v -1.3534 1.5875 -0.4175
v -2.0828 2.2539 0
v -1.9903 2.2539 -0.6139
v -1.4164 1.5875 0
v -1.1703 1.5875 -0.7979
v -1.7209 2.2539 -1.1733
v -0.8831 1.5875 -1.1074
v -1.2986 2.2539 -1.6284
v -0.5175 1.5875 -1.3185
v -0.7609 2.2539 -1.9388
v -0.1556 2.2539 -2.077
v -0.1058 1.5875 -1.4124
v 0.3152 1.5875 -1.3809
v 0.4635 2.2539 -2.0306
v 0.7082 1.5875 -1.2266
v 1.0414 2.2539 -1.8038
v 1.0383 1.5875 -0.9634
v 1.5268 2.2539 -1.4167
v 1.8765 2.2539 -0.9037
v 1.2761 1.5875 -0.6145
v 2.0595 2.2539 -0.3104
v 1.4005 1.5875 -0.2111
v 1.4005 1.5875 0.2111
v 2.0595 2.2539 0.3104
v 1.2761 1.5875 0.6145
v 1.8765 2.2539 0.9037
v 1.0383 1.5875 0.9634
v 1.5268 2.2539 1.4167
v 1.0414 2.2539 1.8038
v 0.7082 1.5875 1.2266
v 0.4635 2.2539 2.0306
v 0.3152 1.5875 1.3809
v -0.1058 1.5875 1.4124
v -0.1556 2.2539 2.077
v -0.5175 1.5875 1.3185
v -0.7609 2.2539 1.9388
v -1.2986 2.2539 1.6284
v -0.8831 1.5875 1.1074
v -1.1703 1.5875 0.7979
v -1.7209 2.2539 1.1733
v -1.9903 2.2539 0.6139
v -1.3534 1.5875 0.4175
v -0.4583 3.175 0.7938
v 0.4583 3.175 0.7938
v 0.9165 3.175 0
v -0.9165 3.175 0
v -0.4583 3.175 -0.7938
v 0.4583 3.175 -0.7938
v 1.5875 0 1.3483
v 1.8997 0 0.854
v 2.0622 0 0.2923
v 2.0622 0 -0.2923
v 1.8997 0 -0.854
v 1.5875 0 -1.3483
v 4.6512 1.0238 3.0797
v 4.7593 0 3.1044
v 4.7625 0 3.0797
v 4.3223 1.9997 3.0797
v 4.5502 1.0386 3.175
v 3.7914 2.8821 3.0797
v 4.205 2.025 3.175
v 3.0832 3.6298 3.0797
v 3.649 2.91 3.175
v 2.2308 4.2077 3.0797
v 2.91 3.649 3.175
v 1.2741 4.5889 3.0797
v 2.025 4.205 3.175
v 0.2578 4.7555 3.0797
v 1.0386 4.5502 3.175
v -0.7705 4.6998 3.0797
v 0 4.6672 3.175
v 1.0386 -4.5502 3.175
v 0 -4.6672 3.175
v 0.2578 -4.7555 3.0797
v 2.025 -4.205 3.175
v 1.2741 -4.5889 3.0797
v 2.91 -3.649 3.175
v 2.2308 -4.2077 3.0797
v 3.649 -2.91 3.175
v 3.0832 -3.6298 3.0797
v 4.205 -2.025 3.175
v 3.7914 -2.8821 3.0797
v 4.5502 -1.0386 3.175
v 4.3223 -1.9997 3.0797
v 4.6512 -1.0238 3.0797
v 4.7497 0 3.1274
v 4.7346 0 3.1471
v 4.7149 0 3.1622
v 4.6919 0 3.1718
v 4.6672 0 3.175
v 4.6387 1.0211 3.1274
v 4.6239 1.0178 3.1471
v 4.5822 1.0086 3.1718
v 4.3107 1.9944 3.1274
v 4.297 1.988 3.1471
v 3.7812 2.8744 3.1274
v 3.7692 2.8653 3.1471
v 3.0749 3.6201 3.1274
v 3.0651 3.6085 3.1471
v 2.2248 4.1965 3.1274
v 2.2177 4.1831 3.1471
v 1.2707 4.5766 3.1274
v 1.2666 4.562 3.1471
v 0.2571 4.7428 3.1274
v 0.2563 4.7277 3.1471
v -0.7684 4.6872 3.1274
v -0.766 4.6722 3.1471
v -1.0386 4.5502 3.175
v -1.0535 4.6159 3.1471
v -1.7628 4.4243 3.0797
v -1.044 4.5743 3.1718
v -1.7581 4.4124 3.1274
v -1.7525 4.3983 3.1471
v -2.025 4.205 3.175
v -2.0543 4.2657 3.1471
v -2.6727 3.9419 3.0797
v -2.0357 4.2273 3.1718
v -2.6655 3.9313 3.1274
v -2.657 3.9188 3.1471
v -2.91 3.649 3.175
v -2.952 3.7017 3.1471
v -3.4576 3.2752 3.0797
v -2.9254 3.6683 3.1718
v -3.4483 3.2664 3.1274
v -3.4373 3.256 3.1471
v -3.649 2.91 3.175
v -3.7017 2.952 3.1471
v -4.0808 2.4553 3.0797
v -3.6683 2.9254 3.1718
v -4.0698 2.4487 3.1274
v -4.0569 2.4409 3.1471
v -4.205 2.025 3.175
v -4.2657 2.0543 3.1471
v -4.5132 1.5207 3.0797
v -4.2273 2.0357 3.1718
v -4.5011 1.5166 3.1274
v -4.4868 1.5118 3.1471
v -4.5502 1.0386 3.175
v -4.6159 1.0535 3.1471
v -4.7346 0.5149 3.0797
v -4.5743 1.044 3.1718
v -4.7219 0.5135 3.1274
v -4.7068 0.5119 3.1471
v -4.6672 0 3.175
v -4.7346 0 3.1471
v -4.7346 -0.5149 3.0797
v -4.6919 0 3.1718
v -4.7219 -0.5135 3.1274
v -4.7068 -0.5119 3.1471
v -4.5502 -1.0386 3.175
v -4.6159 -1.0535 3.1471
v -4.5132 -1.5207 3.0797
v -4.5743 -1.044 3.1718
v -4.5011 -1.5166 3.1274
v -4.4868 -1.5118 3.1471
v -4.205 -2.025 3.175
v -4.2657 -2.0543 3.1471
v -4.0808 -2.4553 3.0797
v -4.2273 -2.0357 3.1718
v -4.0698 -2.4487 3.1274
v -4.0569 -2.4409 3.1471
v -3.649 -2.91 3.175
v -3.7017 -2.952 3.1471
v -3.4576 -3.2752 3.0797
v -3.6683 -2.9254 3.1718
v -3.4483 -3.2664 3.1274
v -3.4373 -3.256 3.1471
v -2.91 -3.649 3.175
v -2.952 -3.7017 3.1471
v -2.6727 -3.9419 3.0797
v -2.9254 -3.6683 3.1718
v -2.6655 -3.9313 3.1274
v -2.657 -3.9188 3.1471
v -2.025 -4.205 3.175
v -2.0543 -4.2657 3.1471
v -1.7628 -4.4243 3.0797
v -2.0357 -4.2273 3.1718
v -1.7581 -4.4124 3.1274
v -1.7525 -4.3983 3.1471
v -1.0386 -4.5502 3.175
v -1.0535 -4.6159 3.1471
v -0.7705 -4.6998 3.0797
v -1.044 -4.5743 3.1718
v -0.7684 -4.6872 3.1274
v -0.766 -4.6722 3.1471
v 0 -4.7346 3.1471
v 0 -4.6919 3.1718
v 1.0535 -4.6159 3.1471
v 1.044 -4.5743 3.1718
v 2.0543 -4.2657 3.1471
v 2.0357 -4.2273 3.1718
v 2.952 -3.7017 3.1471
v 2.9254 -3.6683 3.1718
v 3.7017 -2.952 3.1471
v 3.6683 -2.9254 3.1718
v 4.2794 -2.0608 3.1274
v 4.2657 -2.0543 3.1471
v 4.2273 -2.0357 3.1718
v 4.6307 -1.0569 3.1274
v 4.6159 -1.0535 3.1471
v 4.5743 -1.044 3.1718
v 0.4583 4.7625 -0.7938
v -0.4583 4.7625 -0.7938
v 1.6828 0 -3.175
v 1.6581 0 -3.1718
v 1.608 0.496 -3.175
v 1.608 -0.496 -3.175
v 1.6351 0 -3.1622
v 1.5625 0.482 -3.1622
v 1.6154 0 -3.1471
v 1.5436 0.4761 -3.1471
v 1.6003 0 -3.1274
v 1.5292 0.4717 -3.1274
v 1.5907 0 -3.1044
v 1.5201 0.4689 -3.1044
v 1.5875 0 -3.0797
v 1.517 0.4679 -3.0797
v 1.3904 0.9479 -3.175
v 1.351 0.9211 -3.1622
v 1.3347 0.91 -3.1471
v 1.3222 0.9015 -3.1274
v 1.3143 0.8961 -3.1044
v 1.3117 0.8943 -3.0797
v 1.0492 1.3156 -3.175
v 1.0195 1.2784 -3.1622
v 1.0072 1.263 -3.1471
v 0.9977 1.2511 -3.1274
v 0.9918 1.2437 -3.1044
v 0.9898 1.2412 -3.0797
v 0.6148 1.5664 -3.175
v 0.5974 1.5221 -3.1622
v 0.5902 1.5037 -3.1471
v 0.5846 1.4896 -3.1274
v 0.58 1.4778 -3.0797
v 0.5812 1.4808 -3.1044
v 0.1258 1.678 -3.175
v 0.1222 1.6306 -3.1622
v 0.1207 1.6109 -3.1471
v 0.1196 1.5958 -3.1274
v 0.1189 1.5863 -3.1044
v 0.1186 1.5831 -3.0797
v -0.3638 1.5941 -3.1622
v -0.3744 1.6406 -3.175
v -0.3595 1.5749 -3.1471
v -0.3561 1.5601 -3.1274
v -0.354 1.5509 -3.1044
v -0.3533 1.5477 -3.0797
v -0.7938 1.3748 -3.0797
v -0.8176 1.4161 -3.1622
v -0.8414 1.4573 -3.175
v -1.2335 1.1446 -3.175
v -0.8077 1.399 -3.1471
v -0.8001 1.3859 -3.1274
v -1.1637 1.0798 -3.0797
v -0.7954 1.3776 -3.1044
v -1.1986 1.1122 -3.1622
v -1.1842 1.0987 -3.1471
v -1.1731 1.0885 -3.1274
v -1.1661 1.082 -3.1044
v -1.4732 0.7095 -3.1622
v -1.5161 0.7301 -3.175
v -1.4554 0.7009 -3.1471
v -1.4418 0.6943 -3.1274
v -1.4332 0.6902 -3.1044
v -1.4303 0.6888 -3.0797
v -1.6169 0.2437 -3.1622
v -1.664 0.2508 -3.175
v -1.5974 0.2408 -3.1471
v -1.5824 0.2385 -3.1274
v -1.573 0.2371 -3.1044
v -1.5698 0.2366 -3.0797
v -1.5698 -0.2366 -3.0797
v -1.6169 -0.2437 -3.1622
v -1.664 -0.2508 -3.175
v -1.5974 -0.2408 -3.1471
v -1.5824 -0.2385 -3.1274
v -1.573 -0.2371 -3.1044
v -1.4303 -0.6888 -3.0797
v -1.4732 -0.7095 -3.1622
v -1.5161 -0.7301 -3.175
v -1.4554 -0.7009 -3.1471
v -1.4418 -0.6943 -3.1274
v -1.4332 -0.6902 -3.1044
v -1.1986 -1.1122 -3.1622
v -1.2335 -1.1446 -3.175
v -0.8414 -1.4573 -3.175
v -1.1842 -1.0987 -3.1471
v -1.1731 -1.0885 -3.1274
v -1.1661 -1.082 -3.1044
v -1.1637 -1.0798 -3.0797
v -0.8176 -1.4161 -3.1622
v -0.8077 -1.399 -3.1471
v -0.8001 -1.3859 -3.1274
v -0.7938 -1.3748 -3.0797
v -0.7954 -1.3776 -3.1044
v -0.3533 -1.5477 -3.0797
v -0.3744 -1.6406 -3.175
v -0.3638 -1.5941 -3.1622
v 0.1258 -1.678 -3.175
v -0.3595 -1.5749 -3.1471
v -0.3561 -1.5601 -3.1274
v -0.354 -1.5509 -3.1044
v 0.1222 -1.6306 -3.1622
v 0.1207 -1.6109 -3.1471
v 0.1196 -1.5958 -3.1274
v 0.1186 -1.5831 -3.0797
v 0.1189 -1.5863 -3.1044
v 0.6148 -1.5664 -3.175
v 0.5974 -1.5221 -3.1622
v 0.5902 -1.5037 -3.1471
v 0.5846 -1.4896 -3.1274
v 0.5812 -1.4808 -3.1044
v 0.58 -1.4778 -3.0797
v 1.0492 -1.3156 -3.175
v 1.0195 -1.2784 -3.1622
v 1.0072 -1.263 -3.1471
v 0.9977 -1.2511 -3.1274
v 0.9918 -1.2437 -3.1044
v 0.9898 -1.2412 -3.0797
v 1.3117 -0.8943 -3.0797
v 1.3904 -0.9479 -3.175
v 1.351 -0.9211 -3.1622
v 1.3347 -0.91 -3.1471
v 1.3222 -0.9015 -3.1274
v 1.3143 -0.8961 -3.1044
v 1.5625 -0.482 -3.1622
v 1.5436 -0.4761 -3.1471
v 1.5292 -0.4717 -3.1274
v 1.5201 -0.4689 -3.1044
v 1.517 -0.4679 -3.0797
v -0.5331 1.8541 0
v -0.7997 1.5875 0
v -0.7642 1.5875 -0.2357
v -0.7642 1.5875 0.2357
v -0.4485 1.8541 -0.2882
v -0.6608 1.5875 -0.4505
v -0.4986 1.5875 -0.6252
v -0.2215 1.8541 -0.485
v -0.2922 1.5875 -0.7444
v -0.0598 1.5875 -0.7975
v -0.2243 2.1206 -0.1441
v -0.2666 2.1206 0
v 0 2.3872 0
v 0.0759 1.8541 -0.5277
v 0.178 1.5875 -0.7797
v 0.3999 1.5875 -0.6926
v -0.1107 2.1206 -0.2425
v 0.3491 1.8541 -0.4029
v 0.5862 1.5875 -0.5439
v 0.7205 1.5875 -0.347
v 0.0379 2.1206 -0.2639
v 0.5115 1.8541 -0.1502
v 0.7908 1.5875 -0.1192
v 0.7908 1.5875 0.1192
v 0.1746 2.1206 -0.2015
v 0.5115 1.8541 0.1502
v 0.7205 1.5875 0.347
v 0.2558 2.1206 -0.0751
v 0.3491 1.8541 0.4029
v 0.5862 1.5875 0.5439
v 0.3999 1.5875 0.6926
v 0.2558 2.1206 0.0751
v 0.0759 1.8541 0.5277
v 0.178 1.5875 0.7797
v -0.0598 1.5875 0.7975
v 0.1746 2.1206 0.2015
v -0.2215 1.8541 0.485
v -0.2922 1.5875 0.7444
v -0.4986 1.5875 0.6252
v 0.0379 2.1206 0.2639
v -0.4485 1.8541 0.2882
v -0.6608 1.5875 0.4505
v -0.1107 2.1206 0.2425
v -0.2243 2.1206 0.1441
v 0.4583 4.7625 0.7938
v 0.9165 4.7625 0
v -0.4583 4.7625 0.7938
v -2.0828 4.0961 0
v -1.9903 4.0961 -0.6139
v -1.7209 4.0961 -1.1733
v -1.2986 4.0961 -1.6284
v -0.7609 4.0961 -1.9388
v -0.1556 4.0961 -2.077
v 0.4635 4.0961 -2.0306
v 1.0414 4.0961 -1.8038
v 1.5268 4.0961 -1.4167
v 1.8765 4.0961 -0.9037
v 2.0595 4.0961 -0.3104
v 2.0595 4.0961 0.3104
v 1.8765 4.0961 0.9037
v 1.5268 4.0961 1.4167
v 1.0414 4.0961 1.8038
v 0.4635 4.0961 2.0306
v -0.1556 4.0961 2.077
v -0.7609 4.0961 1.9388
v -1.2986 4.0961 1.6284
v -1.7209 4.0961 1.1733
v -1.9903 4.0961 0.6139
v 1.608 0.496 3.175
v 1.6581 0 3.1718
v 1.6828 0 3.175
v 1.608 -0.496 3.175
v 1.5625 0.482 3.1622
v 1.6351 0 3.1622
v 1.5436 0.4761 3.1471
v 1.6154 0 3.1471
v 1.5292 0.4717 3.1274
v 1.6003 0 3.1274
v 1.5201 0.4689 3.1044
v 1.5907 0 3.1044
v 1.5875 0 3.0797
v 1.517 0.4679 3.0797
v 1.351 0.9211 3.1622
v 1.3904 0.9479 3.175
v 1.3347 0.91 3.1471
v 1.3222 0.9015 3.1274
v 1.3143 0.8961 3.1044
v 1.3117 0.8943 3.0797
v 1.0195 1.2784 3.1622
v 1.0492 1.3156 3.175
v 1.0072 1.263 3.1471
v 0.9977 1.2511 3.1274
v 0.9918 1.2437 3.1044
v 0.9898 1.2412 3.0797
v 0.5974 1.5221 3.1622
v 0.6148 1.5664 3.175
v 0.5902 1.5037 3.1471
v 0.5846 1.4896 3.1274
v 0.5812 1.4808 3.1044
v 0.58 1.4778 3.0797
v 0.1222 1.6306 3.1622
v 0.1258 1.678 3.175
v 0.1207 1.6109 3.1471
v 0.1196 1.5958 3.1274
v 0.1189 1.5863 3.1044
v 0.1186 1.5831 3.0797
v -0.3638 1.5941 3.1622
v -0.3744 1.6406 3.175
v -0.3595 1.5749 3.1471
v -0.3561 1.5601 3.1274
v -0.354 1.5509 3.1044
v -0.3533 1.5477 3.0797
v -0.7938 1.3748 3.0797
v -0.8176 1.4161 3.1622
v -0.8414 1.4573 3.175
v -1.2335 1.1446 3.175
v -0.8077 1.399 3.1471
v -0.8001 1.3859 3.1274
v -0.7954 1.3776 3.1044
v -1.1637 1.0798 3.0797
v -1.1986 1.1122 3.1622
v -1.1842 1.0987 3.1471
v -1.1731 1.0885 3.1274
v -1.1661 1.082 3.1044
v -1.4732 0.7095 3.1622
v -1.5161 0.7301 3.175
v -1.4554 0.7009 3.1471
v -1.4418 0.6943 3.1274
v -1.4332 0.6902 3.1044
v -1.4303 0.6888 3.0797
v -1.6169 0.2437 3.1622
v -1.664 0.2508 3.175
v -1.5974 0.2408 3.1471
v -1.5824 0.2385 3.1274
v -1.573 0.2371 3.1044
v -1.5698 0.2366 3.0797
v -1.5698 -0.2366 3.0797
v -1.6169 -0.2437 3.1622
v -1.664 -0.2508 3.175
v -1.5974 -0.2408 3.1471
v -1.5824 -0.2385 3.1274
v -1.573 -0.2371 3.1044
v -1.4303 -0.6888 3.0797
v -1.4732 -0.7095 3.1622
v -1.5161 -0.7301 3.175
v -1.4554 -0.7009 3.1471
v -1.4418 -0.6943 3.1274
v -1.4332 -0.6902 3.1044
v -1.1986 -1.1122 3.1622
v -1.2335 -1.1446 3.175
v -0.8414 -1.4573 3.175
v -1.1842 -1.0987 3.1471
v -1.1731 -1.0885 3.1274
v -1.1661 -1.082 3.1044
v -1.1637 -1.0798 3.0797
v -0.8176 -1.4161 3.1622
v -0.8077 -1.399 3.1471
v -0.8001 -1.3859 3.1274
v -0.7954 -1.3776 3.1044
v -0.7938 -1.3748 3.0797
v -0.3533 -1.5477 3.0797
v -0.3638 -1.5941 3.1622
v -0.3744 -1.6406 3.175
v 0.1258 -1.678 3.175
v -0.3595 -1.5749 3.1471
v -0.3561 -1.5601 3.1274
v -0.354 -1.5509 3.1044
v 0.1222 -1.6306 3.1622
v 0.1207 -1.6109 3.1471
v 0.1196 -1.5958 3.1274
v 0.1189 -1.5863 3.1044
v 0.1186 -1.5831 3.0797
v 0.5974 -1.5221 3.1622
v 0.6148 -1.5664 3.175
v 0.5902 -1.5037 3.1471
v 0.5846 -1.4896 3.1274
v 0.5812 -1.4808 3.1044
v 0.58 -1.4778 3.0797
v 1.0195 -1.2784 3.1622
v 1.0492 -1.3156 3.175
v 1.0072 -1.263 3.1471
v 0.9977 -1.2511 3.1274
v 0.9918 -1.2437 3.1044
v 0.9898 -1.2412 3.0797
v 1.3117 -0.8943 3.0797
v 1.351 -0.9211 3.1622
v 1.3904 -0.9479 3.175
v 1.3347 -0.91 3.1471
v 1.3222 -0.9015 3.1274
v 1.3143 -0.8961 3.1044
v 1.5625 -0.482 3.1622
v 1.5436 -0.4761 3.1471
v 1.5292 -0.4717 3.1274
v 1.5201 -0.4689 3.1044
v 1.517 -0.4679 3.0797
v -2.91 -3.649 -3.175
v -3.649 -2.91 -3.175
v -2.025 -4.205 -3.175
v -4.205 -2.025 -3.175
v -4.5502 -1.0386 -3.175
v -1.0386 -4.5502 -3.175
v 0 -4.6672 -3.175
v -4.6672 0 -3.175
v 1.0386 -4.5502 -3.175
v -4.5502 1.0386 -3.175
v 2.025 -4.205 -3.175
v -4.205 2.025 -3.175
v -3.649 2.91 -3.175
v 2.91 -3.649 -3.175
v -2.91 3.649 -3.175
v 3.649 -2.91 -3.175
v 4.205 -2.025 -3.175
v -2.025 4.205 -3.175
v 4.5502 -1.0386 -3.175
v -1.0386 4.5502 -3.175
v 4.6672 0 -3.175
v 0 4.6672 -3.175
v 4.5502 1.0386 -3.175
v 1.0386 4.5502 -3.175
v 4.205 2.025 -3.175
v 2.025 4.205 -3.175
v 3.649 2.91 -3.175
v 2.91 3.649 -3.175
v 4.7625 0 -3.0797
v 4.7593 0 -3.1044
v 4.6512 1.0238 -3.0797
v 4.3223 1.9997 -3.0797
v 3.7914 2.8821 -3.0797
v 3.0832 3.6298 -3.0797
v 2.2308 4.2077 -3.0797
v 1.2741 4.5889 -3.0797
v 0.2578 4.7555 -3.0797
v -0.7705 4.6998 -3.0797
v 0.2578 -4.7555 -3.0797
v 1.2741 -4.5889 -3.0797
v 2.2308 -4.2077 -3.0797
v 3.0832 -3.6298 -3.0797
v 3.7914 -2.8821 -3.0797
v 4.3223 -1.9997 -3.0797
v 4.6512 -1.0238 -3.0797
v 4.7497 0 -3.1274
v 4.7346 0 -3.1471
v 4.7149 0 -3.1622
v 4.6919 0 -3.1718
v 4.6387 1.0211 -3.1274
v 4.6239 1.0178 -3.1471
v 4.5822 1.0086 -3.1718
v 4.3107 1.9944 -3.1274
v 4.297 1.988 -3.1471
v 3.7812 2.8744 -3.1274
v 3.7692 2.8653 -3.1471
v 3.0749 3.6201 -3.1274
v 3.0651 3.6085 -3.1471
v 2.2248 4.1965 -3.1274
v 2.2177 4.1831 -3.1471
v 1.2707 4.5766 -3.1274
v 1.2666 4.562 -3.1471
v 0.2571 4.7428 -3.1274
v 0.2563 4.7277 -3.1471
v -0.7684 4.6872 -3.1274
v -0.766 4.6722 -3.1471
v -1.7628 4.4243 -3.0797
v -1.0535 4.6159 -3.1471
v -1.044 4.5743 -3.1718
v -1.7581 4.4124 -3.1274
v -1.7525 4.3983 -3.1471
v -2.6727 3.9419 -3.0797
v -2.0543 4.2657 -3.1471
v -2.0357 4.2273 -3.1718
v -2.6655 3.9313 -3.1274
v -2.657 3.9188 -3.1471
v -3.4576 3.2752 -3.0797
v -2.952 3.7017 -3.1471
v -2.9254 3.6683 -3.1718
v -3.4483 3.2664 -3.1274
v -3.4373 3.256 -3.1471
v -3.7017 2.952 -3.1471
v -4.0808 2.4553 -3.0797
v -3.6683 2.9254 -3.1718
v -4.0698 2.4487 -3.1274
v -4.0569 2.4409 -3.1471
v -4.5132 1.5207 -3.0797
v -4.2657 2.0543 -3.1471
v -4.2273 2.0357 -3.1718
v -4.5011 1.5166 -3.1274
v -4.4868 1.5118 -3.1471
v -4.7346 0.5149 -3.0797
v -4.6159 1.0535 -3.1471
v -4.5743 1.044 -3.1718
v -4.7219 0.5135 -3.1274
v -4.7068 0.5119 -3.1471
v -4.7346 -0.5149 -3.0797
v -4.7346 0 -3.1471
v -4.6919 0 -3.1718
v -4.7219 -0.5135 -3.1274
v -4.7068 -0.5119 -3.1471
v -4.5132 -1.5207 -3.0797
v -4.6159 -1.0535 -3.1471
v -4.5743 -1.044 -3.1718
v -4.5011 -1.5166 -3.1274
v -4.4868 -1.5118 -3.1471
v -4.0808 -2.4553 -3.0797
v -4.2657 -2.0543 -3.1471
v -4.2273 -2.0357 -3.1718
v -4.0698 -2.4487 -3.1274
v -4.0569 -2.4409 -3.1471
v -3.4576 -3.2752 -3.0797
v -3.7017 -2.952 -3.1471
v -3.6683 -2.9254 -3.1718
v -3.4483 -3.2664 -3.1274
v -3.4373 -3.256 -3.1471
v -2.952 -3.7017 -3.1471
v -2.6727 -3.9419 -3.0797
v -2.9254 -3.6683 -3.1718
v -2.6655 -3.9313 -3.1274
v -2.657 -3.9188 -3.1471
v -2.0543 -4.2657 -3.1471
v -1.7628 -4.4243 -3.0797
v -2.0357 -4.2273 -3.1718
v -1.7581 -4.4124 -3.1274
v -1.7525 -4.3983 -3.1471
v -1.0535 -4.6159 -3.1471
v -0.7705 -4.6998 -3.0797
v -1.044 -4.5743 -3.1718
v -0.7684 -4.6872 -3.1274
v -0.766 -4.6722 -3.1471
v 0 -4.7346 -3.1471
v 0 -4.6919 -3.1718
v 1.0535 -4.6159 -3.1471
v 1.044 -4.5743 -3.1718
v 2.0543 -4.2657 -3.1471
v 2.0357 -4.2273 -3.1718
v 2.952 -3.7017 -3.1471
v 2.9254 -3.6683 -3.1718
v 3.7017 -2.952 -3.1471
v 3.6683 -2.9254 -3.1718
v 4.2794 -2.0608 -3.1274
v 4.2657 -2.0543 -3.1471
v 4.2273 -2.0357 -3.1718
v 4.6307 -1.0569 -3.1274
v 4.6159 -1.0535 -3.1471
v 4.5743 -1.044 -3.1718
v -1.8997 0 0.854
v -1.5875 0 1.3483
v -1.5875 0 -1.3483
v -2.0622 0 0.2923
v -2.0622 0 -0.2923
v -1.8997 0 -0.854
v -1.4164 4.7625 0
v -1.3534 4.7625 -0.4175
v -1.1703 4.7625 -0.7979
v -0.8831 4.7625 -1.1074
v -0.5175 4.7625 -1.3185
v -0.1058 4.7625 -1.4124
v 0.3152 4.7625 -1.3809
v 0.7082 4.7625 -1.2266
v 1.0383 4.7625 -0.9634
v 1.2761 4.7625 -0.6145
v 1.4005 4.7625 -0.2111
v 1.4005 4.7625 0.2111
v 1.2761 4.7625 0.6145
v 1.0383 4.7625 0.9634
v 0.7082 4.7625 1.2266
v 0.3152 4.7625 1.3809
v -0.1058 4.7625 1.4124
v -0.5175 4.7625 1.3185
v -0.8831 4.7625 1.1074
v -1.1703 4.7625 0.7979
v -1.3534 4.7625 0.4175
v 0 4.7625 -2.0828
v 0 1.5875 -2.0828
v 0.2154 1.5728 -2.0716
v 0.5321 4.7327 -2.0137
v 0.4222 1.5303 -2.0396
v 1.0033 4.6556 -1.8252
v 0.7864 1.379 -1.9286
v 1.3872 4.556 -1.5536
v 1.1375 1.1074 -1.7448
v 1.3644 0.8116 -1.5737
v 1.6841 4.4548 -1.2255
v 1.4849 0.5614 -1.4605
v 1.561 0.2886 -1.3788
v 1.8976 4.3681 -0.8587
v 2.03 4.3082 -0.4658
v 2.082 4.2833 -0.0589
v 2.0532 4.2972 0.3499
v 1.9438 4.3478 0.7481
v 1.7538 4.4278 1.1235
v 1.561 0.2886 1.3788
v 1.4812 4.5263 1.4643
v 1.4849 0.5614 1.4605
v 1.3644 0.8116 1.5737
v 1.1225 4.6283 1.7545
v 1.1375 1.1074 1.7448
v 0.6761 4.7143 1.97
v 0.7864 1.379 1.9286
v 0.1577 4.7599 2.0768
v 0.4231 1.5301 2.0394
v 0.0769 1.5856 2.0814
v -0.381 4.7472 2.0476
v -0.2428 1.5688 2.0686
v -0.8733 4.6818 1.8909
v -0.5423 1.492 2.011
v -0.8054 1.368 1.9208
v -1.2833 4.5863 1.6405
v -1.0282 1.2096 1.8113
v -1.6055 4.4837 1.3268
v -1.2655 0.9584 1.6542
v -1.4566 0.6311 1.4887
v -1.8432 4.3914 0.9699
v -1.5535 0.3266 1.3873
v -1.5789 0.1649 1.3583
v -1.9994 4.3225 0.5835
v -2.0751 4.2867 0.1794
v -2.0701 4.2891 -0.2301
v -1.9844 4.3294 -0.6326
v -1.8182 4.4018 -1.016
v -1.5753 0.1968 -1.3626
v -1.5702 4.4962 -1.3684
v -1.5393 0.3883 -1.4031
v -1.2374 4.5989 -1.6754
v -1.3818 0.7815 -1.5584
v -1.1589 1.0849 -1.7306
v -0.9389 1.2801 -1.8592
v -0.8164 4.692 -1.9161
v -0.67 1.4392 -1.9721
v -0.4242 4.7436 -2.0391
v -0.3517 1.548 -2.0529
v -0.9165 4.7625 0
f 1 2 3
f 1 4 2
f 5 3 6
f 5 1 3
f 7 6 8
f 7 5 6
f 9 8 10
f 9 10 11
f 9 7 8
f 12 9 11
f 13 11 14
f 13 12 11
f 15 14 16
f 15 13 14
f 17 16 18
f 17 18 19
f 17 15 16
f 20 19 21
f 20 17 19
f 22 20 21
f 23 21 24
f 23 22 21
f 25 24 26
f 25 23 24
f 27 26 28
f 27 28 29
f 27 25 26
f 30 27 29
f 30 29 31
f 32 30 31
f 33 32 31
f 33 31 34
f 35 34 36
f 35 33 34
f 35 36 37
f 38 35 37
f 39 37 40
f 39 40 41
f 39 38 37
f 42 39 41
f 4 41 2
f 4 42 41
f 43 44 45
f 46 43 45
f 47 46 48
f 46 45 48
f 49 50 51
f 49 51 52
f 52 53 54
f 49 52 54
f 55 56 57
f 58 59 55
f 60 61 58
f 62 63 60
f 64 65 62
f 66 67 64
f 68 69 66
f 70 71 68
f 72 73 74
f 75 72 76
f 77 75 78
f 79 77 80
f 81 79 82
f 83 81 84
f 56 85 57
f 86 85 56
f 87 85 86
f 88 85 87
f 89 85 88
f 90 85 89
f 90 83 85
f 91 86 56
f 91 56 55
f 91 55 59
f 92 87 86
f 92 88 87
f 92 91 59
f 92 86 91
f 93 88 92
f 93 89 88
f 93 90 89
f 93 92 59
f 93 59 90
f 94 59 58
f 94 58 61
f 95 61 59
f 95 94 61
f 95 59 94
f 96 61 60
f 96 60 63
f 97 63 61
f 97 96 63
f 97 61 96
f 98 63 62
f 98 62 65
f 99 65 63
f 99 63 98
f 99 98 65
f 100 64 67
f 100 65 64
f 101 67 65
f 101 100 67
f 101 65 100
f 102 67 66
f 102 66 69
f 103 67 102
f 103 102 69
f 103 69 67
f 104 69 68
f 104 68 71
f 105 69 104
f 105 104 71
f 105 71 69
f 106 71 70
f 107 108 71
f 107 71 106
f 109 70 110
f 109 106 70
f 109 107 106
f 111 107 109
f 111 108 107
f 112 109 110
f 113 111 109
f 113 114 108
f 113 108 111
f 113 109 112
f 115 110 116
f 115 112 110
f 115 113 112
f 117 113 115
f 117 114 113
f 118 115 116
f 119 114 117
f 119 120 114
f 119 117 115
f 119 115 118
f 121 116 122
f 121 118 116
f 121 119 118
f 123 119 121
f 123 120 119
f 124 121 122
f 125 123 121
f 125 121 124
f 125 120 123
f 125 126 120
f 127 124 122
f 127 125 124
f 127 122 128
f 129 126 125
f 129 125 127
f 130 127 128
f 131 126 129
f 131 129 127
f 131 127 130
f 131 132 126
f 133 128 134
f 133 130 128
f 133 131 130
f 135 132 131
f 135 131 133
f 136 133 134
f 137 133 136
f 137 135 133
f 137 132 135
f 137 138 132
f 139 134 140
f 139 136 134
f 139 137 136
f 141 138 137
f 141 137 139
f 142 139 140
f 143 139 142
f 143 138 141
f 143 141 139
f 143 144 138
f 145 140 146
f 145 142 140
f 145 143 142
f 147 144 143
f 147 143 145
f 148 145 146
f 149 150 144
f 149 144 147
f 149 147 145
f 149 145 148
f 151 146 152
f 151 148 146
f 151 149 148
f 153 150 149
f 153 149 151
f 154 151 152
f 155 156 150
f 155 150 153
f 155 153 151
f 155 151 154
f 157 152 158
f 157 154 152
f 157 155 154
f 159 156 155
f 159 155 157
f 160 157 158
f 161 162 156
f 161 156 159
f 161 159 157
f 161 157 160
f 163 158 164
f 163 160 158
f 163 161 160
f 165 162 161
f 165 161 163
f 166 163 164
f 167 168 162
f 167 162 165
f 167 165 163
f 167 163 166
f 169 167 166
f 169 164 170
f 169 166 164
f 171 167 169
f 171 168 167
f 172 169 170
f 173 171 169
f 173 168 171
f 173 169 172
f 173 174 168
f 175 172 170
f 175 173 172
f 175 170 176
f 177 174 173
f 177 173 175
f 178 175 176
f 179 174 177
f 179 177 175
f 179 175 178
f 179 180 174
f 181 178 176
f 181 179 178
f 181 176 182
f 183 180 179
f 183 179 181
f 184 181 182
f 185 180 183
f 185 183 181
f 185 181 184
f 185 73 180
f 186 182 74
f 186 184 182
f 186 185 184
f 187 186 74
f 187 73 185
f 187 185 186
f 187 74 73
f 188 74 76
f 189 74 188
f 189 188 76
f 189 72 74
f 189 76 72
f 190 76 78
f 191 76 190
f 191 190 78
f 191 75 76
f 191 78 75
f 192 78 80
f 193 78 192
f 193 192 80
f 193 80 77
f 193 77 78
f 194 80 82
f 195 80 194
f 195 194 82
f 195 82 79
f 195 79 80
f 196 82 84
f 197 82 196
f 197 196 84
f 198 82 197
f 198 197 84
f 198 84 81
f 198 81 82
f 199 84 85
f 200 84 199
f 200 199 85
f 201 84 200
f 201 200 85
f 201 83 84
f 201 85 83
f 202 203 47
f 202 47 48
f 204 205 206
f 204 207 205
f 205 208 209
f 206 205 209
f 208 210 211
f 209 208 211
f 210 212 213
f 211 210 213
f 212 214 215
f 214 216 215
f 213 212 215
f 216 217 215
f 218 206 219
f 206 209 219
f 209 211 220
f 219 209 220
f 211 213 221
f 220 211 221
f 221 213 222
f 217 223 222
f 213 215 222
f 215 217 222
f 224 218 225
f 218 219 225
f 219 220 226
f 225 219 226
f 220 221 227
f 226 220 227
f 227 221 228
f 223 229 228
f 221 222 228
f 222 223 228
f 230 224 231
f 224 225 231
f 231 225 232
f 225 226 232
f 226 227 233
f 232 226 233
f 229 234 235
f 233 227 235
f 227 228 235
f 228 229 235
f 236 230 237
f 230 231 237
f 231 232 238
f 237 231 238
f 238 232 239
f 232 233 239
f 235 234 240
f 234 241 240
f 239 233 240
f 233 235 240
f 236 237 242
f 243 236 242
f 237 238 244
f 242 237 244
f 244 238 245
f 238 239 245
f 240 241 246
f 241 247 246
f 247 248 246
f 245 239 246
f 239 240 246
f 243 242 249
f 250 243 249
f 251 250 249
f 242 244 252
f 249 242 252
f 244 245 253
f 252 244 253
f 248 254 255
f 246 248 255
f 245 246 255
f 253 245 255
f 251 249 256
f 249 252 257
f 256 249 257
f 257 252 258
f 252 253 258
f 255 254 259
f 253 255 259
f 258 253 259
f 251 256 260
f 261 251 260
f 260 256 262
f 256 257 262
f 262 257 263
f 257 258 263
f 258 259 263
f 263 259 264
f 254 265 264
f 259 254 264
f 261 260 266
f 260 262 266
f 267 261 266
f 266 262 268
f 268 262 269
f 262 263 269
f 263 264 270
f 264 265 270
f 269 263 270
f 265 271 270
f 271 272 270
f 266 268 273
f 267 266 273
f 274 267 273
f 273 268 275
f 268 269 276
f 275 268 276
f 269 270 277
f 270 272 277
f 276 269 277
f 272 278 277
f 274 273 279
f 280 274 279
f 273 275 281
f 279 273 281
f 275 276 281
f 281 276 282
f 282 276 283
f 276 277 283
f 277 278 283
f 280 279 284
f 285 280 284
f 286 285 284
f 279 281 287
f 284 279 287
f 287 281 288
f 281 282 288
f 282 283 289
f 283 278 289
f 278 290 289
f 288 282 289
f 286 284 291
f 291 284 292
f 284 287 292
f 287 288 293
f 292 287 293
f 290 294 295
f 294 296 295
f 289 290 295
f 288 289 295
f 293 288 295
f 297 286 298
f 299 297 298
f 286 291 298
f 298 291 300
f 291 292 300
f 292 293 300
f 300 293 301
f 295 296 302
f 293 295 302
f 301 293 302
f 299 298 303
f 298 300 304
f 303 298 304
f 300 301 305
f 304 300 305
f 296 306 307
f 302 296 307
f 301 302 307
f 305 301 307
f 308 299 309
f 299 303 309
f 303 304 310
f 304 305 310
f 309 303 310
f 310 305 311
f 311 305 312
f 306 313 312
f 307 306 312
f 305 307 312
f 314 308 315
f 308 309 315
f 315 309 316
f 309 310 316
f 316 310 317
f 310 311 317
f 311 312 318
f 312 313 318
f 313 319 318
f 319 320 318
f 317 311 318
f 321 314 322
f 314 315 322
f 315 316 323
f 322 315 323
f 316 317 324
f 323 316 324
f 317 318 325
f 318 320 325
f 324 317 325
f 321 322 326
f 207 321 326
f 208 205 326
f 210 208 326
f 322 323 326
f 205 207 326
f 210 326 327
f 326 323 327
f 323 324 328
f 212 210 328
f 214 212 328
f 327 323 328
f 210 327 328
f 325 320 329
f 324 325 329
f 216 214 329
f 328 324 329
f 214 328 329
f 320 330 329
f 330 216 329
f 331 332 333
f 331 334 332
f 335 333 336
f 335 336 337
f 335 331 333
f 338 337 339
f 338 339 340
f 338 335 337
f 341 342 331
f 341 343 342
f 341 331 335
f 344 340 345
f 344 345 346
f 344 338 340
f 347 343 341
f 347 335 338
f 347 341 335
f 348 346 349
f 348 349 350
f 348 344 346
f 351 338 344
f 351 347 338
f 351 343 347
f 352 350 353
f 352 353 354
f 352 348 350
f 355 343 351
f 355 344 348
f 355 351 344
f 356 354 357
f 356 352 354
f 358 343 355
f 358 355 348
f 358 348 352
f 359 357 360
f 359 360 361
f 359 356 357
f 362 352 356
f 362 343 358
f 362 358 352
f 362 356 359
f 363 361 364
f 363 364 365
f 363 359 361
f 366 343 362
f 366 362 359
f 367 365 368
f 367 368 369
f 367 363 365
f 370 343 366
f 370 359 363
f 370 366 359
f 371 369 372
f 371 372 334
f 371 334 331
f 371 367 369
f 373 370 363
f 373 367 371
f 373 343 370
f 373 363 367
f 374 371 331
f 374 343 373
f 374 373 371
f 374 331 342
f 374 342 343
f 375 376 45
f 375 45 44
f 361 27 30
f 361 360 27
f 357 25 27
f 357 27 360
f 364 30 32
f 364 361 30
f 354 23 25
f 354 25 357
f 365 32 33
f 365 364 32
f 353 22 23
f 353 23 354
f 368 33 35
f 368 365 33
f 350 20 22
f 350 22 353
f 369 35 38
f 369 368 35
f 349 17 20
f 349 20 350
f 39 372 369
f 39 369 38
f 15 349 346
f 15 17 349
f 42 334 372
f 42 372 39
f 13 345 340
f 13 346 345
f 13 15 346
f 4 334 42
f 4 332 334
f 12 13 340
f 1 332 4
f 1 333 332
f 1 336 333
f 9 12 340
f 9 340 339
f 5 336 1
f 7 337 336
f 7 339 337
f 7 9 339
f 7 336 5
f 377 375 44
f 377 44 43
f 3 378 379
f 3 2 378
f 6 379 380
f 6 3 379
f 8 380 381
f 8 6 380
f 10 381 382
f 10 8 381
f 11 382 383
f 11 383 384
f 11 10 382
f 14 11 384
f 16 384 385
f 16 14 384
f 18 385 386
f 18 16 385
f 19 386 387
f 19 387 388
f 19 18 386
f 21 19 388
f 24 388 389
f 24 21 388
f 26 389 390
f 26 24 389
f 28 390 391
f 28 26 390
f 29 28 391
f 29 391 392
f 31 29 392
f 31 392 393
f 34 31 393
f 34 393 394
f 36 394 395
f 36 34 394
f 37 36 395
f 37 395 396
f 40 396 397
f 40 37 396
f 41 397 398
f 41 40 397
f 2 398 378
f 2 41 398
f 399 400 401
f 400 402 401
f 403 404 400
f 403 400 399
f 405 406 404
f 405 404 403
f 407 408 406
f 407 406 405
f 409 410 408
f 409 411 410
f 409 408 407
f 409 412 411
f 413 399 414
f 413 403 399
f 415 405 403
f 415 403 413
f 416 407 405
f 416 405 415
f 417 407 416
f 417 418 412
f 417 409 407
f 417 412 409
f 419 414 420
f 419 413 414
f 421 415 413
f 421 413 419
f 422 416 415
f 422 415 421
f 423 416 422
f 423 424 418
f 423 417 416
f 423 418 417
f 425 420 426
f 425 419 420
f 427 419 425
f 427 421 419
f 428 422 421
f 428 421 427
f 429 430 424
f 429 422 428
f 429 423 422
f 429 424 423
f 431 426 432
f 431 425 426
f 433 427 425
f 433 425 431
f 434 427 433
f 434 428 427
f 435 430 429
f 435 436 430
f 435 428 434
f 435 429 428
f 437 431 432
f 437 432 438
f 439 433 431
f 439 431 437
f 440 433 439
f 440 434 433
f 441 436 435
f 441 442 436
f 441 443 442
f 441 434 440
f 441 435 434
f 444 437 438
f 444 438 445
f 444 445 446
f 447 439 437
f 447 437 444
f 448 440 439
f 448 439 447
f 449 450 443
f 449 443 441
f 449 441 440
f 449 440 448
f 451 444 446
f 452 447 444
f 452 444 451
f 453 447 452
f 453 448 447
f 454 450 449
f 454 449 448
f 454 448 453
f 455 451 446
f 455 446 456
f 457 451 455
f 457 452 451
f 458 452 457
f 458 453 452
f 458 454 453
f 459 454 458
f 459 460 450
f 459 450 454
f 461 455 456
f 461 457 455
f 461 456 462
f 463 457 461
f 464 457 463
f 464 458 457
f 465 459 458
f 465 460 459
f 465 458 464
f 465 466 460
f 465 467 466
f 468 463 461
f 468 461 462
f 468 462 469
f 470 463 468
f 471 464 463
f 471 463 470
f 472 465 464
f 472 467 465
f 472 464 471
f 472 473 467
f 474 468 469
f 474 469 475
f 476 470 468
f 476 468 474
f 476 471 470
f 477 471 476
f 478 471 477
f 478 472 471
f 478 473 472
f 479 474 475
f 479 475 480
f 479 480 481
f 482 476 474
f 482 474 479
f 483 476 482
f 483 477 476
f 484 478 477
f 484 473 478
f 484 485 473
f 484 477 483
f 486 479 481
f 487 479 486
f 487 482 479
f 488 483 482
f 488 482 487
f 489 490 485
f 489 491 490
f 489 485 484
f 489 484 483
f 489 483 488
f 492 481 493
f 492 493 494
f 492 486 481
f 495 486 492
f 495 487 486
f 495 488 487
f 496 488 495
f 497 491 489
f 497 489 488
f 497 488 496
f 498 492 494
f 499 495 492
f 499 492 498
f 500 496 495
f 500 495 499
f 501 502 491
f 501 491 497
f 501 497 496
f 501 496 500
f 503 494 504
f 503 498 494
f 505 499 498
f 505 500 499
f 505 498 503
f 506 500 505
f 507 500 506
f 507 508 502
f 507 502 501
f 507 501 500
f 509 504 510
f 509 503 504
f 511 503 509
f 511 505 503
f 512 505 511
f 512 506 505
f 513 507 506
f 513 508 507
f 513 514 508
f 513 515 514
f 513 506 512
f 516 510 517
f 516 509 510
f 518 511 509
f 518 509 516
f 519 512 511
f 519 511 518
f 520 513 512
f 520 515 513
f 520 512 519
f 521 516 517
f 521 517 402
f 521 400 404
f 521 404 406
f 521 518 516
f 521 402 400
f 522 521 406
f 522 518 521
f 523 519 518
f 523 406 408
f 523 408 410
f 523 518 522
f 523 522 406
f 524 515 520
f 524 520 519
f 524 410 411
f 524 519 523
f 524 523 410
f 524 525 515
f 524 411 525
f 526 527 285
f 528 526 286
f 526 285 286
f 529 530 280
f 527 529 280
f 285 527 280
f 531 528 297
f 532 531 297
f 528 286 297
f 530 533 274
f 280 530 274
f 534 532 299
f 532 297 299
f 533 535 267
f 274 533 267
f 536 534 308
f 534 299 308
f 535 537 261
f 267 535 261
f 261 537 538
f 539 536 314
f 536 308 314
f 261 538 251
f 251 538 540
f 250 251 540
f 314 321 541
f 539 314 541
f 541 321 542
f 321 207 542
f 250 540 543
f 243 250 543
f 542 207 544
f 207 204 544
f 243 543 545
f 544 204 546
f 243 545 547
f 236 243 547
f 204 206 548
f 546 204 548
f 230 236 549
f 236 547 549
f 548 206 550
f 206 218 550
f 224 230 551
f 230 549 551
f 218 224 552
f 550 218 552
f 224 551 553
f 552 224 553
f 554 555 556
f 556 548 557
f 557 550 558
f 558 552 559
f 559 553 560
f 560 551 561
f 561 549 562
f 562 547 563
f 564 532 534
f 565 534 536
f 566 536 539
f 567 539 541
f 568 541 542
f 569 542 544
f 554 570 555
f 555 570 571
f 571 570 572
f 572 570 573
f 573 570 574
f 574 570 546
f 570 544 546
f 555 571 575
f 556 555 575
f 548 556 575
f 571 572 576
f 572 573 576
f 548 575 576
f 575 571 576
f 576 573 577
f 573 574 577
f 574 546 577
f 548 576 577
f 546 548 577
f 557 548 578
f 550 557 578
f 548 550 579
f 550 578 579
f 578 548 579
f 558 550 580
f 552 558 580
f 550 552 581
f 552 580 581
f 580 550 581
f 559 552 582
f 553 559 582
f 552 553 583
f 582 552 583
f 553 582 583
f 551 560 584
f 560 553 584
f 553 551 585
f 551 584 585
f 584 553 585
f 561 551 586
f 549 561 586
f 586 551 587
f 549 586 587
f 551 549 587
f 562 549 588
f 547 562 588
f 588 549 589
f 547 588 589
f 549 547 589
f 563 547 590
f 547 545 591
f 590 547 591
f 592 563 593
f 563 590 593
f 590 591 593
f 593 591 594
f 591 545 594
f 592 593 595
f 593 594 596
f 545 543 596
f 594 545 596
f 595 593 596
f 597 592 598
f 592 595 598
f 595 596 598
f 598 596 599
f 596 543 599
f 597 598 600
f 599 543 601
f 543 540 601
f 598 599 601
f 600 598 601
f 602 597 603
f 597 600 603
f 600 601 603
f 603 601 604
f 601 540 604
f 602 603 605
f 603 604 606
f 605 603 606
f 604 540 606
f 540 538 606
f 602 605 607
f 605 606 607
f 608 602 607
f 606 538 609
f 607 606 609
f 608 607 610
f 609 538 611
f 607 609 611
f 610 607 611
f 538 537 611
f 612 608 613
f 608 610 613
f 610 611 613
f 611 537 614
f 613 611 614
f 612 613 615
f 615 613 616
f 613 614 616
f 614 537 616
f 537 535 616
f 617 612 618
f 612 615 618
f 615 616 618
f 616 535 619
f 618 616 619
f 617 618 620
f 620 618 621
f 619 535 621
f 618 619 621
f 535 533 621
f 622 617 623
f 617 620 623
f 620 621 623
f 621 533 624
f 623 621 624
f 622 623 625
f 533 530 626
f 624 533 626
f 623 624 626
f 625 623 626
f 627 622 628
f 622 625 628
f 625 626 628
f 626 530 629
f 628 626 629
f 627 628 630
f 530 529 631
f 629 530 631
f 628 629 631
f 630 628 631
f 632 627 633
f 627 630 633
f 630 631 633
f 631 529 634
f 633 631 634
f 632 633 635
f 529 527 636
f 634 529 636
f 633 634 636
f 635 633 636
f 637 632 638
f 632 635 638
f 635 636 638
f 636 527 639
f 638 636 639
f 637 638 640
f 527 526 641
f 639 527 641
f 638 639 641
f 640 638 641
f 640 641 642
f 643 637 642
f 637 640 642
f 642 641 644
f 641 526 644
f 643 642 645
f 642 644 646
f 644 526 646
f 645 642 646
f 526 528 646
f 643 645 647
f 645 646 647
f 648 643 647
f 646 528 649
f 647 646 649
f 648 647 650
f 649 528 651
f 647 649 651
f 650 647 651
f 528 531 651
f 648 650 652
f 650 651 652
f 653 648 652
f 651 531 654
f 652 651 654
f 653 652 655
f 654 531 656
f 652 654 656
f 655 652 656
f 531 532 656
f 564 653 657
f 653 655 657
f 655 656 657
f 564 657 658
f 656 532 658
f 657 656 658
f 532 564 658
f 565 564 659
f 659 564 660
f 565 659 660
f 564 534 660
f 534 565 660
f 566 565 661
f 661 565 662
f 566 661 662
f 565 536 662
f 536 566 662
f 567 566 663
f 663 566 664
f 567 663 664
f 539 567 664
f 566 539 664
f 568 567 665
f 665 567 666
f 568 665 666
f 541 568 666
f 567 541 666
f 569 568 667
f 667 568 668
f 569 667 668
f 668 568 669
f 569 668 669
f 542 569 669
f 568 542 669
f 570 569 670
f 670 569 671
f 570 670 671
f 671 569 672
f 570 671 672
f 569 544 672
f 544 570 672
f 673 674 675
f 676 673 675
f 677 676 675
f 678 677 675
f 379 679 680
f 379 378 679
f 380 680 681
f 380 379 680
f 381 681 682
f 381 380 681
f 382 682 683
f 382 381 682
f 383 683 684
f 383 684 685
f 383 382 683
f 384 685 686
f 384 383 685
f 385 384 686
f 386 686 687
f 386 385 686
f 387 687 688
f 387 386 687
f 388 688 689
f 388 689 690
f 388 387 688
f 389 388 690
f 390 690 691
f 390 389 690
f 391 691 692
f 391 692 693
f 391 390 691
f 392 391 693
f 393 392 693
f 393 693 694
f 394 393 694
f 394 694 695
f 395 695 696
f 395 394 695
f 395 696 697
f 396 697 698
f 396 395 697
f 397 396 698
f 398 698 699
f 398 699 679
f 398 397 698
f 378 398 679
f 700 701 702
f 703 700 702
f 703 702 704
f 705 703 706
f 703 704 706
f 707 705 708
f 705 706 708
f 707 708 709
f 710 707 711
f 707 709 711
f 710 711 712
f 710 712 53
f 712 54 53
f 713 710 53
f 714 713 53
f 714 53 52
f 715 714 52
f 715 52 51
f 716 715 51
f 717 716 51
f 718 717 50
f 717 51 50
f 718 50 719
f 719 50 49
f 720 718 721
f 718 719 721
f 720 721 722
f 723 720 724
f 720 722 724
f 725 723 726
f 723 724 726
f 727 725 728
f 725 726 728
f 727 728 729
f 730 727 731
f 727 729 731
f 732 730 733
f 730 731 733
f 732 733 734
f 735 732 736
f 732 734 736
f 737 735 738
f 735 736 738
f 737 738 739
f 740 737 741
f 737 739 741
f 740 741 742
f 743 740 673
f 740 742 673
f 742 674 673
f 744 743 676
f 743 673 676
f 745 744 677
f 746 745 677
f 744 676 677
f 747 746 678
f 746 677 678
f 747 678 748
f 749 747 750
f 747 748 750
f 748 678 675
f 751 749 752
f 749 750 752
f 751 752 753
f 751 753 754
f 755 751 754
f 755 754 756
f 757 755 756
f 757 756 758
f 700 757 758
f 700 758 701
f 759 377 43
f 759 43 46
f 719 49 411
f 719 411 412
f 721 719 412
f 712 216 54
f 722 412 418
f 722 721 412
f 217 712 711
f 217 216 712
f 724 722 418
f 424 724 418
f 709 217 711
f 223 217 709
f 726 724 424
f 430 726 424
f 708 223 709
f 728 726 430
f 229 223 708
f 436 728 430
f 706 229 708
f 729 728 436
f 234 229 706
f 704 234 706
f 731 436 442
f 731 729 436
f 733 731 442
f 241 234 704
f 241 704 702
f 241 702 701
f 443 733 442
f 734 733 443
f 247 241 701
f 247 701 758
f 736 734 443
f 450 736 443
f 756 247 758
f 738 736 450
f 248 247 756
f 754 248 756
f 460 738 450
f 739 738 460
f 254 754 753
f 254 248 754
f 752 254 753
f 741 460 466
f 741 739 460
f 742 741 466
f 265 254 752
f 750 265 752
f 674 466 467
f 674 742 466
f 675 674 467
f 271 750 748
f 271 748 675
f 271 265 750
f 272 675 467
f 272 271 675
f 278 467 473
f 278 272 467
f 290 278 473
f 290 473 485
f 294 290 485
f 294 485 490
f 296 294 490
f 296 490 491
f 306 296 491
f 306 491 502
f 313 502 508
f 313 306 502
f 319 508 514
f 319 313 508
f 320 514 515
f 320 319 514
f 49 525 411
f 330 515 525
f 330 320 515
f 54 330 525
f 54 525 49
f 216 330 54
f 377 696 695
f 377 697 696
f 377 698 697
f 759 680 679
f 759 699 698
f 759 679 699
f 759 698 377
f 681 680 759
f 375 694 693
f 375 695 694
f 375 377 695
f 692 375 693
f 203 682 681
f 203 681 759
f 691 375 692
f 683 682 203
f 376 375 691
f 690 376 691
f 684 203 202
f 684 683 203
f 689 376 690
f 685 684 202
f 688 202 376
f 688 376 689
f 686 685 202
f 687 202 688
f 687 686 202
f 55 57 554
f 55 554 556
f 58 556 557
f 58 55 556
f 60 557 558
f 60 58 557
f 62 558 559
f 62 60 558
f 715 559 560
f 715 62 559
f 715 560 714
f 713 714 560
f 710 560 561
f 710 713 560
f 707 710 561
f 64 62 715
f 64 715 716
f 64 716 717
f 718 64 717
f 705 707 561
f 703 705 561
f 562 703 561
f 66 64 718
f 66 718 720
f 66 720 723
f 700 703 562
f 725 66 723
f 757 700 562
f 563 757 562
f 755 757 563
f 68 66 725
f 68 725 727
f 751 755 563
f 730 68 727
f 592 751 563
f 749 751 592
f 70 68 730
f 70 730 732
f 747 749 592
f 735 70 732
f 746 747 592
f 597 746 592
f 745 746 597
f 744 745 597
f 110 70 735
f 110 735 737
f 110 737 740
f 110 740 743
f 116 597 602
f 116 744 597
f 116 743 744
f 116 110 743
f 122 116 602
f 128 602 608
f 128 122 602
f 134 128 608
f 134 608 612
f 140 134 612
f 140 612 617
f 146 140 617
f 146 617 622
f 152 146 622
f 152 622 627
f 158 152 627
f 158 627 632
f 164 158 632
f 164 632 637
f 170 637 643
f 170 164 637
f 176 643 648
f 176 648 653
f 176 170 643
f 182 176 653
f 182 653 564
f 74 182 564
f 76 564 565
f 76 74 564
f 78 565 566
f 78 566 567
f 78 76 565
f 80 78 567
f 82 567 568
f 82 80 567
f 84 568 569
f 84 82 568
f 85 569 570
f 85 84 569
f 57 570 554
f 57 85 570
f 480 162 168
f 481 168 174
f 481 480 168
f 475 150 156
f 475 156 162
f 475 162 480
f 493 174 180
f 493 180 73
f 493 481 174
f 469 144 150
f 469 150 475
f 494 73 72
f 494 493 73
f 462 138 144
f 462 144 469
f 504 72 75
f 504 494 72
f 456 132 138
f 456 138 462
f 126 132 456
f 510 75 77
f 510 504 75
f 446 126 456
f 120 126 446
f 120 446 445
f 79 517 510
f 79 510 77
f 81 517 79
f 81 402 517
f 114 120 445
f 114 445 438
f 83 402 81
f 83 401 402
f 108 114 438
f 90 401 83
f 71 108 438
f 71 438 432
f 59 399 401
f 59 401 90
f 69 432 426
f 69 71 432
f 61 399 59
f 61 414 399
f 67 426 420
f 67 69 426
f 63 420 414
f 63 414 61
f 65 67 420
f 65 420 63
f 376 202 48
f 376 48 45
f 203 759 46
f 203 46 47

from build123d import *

# Parameters (mm, degrees)
SKETCH1_R          = 4.7625
SKETCH1_R_2        = 1.5875
EXTRUDE1_DEPTH     = 3.175
SKETCH2_R          = 2.0828
CUT_EXTRUDE1_DEPTH = 5.7625
FILLET1_R          = 0.09525
CUT_EXTRUDE2_DEPTH = 1.5875


with BuildPart() as part:
    # Sketch1 → Extrude1 (new body, symmetric)
    with BuildSketch(Plane.XY):
        Circle(SKETCH1_R)
        Circle(SKETCH1_R_2, mode=Mode.SUBTRACT)
    extrude(amount=EXTRUDE1_DEPTH, both=True)

    # Sketch2 → Cut-Extrude1 (cut, through all)
    with BuildSketch(Plane(origin=(41.275, 0, 0), x_dir=(0, 0, -1), z_dir=(0, -1, 0))):
        with Locations((0, -41.275)):
            Circle(SKETCH2_R)
    extrude(amount=-CUT_EXTRUDE1_DEPTH, mode=Mode.SUBTRACT)

    # Fillet1
    fillet1_edges = [part.edges().sort_by_distance(p)[0] for p in [
        (-4.7625, 0, -3.175),
        (-4.7625, 0, 3.175),
        (-1.5875, 0, -3.175),
        (-1.5875, 0, 3.175),
    ]]
    fillet(fillet1_edges, radius=FILLET1_R)


with BuildPart() as body_2:
    # Sketch3 → Revolve1 (revolve)
    with BuildSketch(Plane.XY):
        Polygon((-1.416367744, 1.5875), (-0.799718707, 1.5875), (0, 2.387218707), (0, 4.7625), (-1.416367744, 4.7625), (-2.0828, 4.096067744), (-2.0828, 2.253932256), align=None)
    revolve(axis=Axis((0, 1.5875, 0), (0, -1, 0)))

    # Sketch4 → Cut-Extrude2 (cut)
    with BuildSketch(Plane(origin=(3.3734375, 4.7625, 0), x_dir=(0, 0, -1), z_dir=(0, -1, 0))):
        Polygon((0, -2.456893948), (-0.79375, -2.915165724), (-0.79375, -3.831709276), (0, -4.289981052), (0.79375, -3.831709276), (0.79375, -2.915165724), align=None)
    extrude(amount=CUT_EXTRUDE2_DEPTH, mode=Mode.SUBTRACT)


solid = Compound([part.part, body_2.part])
